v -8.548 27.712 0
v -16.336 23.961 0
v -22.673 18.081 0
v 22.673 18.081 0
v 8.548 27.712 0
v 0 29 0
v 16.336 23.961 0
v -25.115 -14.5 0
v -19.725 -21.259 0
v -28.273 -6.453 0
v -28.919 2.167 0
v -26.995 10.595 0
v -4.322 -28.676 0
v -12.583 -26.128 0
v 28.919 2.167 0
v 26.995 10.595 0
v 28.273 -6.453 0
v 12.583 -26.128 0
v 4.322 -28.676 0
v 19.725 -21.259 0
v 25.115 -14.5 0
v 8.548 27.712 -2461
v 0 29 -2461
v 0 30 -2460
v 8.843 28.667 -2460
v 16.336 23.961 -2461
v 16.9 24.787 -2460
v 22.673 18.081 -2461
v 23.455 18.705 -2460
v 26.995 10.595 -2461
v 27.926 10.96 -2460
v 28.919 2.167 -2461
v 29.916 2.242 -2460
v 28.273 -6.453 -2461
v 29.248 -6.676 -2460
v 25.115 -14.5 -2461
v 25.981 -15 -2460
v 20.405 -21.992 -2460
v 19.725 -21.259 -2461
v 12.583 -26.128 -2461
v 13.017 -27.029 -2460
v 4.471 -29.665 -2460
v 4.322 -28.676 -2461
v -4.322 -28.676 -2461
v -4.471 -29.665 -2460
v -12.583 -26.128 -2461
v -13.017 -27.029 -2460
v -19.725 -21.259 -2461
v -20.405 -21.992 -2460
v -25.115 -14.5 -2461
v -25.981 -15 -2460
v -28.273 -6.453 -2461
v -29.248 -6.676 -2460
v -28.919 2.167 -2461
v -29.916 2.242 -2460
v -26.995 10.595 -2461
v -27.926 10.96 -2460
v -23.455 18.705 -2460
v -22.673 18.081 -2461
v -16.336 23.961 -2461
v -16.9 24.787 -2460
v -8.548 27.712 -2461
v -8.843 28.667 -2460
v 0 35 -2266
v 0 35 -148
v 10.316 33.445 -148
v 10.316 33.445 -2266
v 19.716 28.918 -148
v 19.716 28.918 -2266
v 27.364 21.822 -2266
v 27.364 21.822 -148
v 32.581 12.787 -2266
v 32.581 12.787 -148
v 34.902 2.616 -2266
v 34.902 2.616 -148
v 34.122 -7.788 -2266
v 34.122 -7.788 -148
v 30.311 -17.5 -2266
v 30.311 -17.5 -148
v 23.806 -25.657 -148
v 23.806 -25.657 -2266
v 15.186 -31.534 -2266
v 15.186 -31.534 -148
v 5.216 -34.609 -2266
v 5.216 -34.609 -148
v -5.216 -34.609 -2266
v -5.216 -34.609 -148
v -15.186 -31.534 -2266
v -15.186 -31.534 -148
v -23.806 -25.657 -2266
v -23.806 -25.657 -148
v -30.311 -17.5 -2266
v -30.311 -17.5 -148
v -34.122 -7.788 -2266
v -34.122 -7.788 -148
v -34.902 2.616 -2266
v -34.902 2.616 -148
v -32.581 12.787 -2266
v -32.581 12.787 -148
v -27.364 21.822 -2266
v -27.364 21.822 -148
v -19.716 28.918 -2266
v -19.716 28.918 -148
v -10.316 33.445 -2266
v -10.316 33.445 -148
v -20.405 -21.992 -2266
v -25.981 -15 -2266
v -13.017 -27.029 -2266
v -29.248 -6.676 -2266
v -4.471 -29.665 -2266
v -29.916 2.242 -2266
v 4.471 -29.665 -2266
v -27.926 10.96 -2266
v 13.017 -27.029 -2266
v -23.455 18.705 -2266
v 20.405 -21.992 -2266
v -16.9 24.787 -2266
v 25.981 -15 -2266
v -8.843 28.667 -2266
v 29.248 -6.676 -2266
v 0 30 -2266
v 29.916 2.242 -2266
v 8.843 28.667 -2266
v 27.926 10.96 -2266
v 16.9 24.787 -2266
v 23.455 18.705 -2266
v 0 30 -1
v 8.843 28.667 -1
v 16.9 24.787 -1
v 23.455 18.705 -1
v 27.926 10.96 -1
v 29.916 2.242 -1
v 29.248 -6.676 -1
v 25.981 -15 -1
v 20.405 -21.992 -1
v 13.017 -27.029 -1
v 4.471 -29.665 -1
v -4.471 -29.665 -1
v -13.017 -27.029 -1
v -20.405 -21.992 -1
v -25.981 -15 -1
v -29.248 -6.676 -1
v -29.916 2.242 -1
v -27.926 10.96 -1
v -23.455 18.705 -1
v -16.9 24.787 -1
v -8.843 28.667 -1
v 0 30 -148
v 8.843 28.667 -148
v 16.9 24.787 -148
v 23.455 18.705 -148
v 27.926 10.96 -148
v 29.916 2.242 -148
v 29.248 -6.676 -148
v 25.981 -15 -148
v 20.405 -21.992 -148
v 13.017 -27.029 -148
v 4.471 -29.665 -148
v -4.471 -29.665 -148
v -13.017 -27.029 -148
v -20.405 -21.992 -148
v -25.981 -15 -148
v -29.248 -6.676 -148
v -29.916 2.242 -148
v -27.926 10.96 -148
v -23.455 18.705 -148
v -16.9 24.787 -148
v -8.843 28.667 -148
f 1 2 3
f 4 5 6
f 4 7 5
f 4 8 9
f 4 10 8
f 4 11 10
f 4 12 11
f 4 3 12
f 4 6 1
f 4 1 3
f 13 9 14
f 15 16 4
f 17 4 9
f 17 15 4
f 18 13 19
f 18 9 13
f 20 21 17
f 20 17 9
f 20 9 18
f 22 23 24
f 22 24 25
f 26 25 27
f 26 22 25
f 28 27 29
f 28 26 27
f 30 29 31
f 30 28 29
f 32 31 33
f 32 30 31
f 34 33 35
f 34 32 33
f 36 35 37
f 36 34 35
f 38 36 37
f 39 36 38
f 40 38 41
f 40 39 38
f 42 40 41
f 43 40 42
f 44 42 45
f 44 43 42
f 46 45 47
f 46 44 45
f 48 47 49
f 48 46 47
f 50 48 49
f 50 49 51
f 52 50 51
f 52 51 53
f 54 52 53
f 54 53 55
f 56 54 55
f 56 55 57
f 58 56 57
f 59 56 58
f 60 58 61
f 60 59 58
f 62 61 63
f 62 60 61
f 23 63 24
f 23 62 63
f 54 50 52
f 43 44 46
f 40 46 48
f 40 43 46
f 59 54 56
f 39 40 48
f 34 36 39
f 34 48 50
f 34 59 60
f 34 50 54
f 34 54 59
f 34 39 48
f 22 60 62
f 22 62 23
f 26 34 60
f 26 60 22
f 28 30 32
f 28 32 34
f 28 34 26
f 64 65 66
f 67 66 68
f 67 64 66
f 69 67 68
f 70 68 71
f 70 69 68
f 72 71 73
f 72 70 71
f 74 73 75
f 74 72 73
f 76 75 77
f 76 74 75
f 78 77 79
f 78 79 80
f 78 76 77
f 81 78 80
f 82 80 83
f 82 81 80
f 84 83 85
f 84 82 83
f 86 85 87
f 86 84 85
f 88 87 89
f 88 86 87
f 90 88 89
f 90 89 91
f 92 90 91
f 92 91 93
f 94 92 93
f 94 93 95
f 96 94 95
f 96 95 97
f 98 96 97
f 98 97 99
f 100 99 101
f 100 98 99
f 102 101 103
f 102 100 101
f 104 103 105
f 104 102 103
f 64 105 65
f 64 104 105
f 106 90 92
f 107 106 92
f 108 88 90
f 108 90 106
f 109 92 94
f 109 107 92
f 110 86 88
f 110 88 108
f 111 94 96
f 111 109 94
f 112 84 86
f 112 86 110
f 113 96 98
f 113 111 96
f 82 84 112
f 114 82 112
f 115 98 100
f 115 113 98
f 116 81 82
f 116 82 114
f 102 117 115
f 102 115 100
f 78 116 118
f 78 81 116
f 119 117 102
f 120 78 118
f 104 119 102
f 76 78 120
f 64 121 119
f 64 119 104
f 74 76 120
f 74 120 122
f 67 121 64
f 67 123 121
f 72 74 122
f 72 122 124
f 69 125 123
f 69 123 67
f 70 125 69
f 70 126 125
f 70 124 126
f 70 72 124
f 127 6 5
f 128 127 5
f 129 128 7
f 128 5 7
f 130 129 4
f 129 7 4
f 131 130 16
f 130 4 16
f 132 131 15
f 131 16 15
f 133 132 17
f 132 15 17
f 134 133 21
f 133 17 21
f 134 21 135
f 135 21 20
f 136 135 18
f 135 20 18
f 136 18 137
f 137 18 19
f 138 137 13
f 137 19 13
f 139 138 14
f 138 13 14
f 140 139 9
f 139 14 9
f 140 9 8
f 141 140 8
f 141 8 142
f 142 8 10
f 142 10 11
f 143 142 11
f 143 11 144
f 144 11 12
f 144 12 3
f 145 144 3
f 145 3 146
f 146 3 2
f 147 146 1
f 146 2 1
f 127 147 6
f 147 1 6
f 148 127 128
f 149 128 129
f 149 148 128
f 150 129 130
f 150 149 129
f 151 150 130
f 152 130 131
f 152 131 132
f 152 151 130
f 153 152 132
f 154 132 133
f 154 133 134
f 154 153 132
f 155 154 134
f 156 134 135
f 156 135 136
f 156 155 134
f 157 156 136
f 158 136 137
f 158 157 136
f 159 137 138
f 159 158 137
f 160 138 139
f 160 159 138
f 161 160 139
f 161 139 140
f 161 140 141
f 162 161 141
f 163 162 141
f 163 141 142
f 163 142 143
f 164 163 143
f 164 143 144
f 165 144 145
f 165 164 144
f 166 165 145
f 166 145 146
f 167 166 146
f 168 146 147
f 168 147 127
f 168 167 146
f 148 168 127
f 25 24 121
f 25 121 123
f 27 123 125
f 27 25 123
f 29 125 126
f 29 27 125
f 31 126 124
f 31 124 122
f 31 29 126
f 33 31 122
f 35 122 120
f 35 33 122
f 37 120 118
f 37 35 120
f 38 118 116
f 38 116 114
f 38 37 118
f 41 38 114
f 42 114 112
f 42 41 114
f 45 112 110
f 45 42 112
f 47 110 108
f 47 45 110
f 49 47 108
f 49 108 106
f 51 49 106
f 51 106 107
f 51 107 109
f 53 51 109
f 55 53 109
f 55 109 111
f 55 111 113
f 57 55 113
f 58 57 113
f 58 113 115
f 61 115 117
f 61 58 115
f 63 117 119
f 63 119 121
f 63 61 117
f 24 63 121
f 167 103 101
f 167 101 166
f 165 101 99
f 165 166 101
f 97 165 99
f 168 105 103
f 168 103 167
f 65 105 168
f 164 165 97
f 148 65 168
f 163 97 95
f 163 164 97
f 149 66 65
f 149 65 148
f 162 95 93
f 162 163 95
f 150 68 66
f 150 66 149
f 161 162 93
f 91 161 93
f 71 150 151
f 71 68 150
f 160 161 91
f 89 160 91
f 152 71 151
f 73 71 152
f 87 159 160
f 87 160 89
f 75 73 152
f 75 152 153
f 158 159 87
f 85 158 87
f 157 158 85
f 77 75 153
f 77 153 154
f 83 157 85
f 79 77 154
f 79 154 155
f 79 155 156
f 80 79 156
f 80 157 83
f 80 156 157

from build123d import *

# Parameters (mm, degrees)
CHAMFER_1_SIZE = 1
CHAMFER_2_SIZE = 1


with BuildPart() as part:
    # 草图1 → 旋转1 (revolve)
    with BuildSketch(Plane(origin=(0, 0, 0), x_dir=(0, 0, -1), z_dir=(1, 0, 0))):
        Polygon((0, 0), (0, 30), (148, 30), (148, 35), (2266, 35), (2266, 30), (2461, 30), (2461, 0), align=None)
    revolve(axis=Axis((0, 0, 0), (0, 0, -1)))

    # 倒角1
    chamfer_1_edges = [part.edges().sort_by_distance(p)[0] for p in [
        (0, -30, -2461),
    ]]
    chamfer(chamfer_1_edges, length=CHAMFER_1_SIZE)

    # 倒角2
    chamfer_2_edges = [part.edges().sort_by_distance(p)[0] for p in [
        (0, -30, 0),
    ]]
    chamfer(chamfer_2_edges, length=CHAMFER_2_SIZE)


solid = part.part
